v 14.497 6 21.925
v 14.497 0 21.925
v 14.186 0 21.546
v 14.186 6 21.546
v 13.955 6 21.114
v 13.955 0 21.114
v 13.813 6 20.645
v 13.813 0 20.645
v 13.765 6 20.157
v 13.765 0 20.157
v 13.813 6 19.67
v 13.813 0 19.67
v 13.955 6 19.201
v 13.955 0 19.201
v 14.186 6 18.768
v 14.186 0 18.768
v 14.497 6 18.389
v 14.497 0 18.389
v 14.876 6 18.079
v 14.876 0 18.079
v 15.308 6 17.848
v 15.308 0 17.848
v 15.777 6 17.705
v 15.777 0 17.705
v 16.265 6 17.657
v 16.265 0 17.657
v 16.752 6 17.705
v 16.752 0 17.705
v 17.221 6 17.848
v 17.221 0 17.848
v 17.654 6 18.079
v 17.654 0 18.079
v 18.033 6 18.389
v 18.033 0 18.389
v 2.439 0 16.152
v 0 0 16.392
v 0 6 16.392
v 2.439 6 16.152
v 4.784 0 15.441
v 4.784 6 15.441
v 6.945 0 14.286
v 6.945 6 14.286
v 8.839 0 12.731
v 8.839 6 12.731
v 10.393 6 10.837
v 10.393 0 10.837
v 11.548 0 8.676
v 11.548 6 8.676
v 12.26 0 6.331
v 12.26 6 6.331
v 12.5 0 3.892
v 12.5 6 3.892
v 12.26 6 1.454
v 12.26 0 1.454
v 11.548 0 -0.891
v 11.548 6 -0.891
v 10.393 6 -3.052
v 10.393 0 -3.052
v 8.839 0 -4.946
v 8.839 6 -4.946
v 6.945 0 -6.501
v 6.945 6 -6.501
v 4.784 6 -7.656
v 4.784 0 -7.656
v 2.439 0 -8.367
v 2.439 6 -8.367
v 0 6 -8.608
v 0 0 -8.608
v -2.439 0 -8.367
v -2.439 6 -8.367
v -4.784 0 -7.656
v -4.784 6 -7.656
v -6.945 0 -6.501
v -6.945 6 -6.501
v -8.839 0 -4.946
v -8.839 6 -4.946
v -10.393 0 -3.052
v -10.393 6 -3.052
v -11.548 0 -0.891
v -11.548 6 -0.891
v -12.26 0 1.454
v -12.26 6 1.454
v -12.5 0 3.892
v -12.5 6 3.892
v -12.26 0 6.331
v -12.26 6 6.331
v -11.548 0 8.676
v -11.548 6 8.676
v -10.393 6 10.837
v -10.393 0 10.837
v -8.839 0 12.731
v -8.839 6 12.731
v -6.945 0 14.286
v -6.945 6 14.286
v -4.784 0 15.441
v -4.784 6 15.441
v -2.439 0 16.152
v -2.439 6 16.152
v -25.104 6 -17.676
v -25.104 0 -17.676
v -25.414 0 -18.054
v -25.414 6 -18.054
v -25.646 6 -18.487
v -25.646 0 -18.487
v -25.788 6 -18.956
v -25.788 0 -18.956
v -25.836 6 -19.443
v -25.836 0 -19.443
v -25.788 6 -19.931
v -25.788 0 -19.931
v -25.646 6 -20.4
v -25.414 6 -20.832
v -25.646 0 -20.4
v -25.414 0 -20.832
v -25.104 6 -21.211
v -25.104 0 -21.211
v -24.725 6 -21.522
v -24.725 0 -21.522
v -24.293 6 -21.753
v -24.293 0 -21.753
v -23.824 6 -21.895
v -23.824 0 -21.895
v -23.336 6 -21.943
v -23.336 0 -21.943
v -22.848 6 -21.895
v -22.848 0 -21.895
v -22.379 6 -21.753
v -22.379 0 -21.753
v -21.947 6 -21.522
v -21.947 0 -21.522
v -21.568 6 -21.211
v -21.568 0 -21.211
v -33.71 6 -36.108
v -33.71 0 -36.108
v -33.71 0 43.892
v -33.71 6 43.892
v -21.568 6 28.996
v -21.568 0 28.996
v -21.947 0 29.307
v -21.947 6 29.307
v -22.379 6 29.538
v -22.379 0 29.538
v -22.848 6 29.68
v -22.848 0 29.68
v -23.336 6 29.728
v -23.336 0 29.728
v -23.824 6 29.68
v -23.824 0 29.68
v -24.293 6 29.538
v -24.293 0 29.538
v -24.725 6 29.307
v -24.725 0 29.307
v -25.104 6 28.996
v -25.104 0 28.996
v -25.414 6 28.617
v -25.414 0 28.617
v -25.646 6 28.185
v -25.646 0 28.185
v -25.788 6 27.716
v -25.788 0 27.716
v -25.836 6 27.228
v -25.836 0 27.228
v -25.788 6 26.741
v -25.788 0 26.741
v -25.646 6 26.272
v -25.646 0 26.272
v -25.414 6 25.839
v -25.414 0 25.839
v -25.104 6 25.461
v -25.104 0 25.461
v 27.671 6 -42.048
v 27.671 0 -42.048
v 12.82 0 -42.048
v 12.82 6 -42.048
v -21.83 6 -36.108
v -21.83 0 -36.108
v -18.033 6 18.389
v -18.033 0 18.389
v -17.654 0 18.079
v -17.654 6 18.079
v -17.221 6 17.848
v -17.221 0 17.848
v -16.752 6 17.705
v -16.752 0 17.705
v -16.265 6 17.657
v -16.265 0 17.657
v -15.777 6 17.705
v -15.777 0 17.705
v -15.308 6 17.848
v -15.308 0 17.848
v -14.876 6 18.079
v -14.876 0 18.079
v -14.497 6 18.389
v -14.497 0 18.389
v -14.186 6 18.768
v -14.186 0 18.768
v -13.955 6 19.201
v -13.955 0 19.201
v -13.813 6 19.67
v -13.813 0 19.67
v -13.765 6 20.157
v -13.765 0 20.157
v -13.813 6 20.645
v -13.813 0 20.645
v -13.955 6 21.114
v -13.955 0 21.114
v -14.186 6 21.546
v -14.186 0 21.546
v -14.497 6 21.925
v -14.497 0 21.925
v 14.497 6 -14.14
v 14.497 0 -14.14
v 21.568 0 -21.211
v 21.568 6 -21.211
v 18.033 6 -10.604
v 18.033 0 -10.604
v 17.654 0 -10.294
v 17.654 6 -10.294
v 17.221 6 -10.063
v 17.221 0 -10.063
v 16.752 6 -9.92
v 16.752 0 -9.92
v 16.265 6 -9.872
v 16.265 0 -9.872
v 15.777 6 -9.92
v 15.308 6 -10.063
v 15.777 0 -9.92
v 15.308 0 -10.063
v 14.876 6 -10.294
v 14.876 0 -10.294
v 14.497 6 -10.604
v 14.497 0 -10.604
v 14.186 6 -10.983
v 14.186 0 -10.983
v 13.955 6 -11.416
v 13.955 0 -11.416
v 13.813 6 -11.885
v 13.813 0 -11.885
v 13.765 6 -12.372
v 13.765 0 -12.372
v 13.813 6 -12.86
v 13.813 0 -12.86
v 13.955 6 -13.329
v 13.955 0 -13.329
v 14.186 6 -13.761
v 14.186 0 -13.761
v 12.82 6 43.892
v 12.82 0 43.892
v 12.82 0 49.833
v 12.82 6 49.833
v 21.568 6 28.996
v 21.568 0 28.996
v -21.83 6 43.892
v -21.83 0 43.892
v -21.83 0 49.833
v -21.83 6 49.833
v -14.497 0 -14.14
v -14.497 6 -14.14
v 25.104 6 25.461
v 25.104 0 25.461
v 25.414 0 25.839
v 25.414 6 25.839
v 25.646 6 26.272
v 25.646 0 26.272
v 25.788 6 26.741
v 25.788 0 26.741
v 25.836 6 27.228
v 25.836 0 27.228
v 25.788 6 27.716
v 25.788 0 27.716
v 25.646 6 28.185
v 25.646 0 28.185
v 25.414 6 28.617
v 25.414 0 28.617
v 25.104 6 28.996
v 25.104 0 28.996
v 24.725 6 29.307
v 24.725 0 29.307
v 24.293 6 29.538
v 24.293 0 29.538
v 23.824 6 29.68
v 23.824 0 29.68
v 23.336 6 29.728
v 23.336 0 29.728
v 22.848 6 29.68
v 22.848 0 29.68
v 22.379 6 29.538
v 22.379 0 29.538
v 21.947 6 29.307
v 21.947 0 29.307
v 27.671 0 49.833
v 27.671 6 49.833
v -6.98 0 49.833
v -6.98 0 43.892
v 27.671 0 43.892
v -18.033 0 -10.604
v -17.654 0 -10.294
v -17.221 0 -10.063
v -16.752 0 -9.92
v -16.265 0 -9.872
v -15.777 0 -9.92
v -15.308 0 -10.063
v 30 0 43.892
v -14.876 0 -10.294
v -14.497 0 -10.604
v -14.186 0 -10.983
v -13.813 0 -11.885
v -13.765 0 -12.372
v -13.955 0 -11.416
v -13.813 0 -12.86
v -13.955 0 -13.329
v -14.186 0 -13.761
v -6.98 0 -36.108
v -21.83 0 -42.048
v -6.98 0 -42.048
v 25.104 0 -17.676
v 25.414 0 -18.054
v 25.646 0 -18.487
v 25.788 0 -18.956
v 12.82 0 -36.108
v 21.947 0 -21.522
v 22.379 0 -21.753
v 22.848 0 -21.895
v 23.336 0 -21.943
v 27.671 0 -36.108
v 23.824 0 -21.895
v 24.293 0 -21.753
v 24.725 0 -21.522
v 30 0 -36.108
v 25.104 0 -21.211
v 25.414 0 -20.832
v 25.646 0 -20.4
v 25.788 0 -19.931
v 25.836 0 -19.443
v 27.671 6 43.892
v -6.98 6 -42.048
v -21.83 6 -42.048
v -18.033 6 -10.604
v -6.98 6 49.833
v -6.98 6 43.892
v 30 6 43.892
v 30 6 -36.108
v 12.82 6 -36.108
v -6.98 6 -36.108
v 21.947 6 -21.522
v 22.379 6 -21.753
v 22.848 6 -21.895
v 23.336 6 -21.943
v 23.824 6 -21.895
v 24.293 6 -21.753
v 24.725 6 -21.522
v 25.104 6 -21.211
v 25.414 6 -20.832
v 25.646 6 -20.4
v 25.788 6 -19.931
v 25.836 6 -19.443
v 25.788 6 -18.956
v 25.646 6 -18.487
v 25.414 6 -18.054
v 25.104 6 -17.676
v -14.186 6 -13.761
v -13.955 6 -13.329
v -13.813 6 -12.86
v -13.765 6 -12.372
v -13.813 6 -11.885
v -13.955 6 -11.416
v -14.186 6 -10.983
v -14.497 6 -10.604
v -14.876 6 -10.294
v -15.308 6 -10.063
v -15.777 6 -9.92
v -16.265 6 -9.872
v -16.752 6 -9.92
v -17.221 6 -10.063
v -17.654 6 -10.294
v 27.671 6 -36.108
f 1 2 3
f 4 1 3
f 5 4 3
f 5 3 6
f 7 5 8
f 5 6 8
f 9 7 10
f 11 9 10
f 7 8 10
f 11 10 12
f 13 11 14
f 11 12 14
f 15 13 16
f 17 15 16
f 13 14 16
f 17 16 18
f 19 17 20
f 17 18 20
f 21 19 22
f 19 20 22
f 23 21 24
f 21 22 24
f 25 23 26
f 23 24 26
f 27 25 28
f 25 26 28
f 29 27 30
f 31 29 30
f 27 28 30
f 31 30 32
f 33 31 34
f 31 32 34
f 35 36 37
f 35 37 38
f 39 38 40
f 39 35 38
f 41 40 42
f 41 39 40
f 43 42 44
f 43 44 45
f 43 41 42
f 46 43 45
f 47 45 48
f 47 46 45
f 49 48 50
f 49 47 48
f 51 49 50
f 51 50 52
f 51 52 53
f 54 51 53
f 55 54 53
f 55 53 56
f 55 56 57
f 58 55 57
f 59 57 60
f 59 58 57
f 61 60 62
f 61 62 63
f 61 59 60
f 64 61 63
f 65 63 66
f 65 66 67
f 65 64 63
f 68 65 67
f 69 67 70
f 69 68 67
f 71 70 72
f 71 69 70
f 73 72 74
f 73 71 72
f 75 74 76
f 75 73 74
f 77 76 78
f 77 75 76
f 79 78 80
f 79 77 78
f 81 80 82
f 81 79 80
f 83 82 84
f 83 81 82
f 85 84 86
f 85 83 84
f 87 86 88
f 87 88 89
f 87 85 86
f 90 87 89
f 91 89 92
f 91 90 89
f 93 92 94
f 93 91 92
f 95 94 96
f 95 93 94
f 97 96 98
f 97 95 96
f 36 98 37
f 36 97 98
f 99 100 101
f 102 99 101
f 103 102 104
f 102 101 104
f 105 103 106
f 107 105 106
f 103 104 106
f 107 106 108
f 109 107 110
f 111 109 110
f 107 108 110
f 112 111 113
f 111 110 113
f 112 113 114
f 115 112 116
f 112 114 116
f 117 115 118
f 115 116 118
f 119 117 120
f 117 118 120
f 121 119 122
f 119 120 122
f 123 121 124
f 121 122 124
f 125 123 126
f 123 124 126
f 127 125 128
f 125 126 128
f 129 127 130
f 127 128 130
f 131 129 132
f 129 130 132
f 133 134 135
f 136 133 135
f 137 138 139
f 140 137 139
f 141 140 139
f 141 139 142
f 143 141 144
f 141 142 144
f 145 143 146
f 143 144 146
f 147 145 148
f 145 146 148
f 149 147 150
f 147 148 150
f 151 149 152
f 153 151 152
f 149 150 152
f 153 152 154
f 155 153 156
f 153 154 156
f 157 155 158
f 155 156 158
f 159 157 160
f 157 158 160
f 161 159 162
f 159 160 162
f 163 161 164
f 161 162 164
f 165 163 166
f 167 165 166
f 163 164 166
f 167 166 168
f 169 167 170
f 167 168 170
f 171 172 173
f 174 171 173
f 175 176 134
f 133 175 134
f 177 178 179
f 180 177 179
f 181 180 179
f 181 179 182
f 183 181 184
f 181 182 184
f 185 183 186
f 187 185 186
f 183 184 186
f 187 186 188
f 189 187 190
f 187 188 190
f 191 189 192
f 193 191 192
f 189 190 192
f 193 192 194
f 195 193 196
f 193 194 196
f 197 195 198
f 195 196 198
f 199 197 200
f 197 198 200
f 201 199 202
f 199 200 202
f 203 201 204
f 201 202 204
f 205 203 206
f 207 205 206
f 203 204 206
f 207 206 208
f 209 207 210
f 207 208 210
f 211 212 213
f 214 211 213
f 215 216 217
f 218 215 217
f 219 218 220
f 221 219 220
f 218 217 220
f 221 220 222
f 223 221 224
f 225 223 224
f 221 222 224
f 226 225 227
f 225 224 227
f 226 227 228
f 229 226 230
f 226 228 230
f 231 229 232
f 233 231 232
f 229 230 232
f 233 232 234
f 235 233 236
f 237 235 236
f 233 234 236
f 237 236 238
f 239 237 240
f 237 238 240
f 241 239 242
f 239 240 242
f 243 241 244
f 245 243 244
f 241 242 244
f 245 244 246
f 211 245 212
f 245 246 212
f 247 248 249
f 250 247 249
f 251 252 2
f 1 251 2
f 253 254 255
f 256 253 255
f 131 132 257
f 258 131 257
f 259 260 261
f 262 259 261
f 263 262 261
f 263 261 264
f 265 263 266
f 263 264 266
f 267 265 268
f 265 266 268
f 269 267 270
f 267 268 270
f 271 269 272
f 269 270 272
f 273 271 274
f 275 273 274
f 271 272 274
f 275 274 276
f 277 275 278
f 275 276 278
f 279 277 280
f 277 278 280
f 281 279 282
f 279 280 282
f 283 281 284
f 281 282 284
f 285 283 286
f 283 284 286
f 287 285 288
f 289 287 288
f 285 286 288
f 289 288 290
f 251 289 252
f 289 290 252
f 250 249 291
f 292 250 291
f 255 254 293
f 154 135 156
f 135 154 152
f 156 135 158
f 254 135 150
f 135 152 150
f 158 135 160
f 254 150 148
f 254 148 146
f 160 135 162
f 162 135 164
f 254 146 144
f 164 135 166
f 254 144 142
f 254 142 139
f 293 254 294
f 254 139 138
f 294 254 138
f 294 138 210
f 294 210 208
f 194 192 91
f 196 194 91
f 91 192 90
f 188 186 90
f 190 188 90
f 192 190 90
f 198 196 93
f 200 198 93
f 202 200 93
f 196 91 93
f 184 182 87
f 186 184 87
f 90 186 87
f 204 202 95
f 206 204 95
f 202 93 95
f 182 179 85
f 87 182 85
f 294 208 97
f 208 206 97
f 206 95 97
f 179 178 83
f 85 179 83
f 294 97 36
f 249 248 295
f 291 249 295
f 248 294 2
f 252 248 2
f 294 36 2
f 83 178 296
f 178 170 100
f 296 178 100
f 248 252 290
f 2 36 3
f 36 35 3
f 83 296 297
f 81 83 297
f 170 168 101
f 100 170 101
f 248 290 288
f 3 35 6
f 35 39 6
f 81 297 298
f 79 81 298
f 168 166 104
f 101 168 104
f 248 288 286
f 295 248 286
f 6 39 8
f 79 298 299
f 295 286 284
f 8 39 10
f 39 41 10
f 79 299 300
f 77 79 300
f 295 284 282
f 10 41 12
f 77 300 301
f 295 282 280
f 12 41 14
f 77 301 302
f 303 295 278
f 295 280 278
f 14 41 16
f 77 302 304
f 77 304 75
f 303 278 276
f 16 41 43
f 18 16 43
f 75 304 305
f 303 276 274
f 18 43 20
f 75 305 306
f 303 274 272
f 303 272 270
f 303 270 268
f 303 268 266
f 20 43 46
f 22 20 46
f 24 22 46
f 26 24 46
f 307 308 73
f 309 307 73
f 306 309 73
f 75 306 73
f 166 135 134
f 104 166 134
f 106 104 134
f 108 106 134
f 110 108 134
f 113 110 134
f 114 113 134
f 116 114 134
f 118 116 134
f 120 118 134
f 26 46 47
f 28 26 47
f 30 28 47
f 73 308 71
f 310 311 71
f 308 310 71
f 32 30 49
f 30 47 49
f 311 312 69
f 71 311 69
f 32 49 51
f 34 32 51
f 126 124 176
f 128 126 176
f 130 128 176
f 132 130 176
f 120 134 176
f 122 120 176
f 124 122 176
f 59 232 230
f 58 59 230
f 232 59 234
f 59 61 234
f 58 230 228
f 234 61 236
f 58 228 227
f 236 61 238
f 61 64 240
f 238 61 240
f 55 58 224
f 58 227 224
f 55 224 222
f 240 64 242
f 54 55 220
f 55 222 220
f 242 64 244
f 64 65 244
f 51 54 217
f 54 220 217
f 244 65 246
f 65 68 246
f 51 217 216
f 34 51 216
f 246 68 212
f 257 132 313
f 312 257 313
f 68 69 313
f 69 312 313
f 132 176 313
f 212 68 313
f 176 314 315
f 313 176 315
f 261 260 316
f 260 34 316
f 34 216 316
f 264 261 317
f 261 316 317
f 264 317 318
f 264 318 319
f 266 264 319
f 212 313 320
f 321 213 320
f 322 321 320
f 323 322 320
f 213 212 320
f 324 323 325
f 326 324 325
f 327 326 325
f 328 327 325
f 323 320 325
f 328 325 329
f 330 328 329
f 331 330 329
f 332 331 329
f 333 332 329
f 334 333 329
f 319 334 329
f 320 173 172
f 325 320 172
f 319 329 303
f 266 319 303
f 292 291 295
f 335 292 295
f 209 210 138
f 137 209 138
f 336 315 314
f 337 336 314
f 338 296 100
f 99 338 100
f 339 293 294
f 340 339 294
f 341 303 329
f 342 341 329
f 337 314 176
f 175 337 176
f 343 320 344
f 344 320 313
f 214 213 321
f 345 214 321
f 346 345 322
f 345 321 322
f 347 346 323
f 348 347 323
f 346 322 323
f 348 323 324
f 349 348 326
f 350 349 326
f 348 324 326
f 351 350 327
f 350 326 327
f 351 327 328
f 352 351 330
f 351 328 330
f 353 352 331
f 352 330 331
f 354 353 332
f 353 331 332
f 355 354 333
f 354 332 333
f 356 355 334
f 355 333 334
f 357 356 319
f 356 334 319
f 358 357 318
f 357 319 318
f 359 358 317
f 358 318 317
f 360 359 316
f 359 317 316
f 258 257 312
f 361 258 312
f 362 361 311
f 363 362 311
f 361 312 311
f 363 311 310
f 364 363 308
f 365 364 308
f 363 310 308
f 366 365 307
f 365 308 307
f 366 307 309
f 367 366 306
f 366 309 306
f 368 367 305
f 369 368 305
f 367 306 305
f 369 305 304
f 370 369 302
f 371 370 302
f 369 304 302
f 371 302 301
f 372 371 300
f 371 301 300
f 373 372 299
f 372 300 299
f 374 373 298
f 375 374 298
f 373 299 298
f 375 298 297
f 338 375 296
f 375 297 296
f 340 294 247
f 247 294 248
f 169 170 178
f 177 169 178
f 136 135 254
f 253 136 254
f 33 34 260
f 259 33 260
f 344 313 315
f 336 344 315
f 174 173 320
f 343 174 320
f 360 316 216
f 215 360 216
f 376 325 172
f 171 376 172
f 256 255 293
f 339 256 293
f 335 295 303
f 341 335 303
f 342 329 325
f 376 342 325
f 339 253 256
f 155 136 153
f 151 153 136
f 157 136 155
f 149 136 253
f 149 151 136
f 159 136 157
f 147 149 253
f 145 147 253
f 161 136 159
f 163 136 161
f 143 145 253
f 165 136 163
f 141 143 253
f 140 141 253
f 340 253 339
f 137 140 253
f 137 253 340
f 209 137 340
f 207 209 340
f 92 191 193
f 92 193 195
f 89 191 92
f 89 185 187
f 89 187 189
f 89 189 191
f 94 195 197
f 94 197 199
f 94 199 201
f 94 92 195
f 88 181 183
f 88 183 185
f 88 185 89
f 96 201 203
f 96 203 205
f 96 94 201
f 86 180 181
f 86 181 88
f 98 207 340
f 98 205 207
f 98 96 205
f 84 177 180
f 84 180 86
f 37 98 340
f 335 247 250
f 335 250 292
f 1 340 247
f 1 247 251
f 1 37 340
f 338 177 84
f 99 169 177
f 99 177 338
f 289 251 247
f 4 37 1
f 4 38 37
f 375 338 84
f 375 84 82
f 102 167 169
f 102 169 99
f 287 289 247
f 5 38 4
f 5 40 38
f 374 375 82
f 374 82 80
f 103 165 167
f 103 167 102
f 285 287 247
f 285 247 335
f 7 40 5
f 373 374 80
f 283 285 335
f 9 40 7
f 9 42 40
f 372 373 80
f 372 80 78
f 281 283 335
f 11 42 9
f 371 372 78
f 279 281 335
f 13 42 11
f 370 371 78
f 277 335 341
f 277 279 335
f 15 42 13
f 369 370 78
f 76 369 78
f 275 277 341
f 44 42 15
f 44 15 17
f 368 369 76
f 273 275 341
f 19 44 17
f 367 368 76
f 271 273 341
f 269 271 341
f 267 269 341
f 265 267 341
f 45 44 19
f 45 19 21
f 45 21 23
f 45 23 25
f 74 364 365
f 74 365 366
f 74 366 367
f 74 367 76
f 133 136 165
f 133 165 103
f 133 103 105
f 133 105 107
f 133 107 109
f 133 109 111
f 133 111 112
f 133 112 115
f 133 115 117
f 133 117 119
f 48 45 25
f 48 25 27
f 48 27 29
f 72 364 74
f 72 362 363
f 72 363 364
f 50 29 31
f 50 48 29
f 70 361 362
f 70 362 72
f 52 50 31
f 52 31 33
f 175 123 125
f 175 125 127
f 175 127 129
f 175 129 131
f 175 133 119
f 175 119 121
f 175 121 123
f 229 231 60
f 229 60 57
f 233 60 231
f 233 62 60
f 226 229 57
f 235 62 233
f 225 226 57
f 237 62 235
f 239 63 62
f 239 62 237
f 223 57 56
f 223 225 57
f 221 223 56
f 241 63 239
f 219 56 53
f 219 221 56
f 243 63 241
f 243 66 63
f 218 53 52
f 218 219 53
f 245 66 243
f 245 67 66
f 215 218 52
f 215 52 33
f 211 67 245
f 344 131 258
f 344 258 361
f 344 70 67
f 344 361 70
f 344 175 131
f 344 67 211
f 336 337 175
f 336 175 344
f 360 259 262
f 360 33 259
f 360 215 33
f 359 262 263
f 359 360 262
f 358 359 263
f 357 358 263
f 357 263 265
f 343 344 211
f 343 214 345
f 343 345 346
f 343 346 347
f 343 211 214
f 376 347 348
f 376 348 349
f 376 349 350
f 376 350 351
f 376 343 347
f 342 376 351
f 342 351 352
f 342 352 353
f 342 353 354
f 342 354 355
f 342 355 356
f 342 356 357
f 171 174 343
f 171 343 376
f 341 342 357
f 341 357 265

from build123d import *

# Parameters (mm, degrees)
SKETCH1_R           = 12.5
BOSS_EXTRUDE1_DEPTH = 6


with BuildPart() as part:
    # Sketch1 → Boss-Extrude1 (new body)
    with BuildSketch(Plane(origin=(0, 0, 0), x_dir=(1, 0, 0), z_dir=(0, 1, 0))):
        Polygon((-33.710320086, 36.107507173), (-33.710320086, -43.892492827), (-21.830156213, -43.892492827), (-21.830156213, -49.832574764), (-6.979951371, -49.832574764), (-6.979951371, -43.892492827), (12.820321751, -43.892492827), (12.820321751, -49.832574764), (27.670526593, -49.832574764), (27.670526593, -43.892492827), (30.000473961, -43.892492827), (30.000473961, 36.107507173), (27.670526593, 36.107507173), (27.670526593, 42.047589109), (12.820321751, 42.047589109), (12.820321751, 36.107507173), (-6.979951371, 36.107507173), (-6.979951371, 42.047589109), (-21.830156213, 42.047589109), (-21.830156213, 36.107507173), align=None)
        with Locations(Location((0, -3.892492827, 0), (0, 0, 270))):
            Circle(SKETCH1_R, mode=Mode.SUBTRACT)
        with BuildLine():
            Line((-25.103576844, -25.460535765), (-18.032509032, -18.389467953))
            ThreePointArc((-18.032509032, -18.389467953), (-14.496975126, -18.389467953), (-14.496975126, -21.925001859))
            Line((-14.496975126, -21.925001859), (-21.568042938, -28.996069671))
            ThreePointArc((-21.568042938, -28.996069671), (-25.103576844, -28.996069671), (-25.103576844, -25.460535765))
        make_face(mode=Mode.SUBTRACT)
        with BuildLine():
            Line((-21.568042938, 21.211084017), (-14.496975126, 14.140016205))
            ThreePointArc((-14.496975126, 14.140016205), (-14.496975126, 10.604482299), (-18.032509032, 10.604482299))
            Line((-18.032509032, 10.604482299), (-25.103576844, 17.675550111))
            ThreePointArc((-25.103576844, 17.675550111), (-25.103576844, 21.211084017), (-21.568042938, 21.211084017))
        make_face(mode=Mode.SUBTRACT)
        with BuildLine():
            Line((25.103576844, 17.675550111), (18.032509032, 10.604482299))
            ThreePointArc((18.032509032, 10.604482299), (14.496975126, 10.604482299), (14.496975126, 14.140016205))
            Line((14.496975126, 14.140016205), (21.568042938, 21.211084017))
            ThreePointArc((21.568042938, 21.211084017), (25.103576844, 21.211084017), (25.103576844, 17.675550111))
        make_face(mode=Mode.SUBTRACT)
        with BuildLine():
            Line((21.568042938, -28.996069671), (14.496975126, -21.925001859))
            ThreePointArc((14.496975126, -21.925001859), (14.496975126, -18.389467953), (18.032509032, -18.389467953))
            Line((18.032509032, -18.389467953), (25.103576844, -25.460535765))
            ThreePointArc((25.103576844, -25.460535765), (25.103576844, -28.996069671), (21.568042938, -28.996069671))
        make_face(mode=Mode.SUBTRACT)
    extrude(amount=BOSS_EXTRUDE1_DEPTH)


solid = part.part
